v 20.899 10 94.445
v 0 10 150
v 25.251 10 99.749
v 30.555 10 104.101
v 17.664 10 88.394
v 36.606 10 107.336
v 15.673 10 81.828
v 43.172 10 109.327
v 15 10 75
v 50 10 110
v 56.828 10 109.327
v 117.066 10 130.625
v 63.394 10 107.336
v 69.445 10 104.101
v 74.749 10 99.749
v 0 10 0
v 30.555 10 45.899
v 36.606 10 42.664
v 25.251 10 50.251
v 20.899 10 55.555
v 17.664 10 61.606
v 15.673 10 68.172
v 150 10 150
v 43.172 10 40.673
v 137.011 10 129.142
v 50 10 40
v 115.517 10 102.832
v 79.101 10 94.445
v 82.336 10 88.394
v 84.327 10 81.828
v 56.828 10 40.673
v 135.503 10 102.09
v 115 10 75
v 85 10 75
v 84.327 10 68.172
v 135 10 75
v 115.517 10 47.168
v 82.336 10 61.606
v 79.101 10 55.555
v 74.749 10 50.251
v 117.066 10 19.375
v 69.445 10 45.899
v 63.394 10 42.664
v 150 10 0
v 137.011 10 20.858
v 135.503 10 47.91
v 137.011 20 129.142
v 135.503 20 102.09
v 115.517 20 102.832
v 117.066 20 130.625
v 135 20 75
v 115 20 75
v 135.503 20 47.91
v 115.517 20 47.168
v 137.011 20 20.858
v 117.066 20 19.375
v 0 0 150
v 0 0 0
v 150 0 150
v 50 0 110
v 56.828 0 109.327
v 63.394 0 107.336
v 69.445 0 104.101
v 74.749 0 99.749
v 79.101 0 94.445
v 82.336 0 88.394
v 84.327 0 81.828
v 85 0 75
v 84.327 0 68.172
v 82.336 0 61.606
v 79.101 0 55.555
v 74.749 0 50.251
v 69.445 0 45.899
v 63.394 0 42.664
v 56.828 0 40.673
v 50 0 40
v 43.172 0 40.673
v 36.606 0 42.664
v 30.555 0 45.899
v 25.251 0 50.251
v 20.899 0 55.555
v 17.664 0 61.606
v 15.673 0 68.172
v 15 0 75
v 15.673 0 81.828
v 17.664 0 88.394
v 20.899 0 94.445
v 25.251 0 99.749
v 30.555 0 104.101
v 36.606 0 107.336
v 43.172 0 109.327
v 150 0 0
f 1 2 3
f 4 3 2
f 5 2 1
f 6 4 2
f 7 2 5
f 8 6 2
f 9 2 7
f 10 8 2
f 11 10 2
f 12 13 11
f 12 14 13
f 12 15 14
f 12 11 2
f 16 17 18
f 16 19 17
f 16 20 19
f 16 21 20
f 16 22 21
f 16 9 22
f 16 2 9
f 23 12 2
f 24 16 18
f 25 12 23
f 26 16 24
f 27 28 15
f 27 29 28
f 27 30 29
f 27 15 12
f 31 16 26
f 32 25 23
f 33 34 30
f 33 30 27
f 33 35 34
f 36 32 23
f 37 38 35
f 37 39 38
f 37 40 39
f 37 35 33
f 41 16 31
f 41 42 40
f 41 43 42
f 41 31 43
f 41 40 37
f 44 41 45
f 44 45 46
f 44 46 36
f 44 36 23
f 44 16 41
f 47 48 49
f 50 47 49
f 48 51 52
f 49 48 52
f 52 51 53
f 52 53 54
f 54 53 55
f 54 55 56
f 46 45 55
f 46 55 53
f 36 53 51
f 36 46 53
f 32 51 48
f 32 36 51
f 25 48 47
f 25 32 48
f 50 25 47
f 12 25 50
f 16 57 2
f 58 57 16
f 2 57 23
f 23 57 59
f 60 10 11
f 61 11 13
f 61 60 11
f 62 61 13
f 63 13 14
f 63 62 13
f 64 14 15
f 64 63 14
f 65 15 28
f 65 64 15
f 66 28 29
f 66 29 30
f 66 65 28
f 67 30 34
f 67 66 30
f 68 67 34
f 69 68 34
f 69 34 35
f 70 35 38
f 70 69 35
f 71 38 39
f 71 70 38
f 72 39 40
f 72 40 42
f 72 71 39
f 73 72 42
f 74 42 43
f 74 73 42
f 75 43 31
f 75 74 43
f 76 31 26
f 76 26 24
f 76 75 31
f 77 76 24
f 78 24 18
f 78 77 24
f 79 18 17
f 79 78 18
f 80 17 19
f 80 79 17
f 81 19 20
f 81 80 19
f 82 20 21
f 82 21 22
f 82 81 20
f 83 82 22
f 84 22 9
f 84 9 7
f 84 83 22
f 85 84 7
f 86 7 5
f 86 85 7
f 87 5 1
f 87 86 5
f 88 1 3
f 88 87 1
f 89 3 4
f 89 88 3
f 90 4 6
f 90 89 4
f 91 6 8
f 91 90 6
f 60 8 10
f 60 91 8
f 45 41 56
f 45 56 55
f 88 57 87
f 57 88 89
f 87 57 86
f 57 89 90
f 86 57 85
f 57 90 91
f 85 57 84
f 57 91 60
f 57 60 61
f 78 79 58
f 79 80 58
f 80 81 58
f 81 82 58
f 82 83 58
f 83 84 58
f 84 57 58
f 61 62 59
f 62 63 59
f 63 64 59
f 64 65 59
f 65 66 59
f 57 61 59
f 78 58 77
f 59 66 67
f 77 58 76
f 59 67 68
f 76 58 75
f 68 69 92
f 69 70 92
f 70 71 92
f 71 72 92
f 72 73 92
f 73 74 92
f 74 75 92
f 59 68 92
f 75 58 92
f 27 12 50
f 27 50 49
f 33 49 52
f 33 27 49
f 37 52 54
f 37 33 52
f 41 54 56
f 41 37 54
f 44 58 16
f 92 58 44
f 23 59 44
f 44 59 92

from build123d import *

# Parameters (mm, degrees)
SKETCH1_W           = 150
SKETCH1_H           = 150
SKETCH1_R           = 35
BOSS_EXTRUDE1_DEPTH = 10
BOSS_EXTRUDE2_DEPTH = 10


with BuildPart() as part:
    # Sketch1 → Boss-Extrude1 (new body)
    with BuildSketch(Plane(origin=(0, 0, 0), x_dir=(1, 0, 0), z_dir=(0, 1, 0))):
        with Locations((75, -75)):
            Rectangle(SKETCH1_W, SKETCH1_H)
        with Locations(Location((50, -75, 0), (0, 0, 270))):
            Circle(SKETCH1_R, mode=Mode.SUBTRACT)
    extrude(amount=BOSS_EXTRUDE1_DEPTH)

    # Sketch7 → Boss-Extrude2 (add)
    with BuildSketch(Plane(origin=(0, 10, 0), x_dir=(1, 0, 0), z_dir=(0, 1, 0))):
        with BuildLine():
            Line((117.065640108, -19.374526579), (137.010556372, -20.857872537))
            ThreePointArc((137.010556372, -20.857872537), (135, -75), (137.010556372, -129.142127463))
            Line((137.010556372, -129.142127463), (117.065640108, -130.625473421))
            ThreePointArc((117.065640108, -130.625473421), (115, -75), (117.065640108, -19.374526579))
        make_face()
    extrude(amount=BOSS_EXTRUDE2_DEPTH)


solid = part.part
